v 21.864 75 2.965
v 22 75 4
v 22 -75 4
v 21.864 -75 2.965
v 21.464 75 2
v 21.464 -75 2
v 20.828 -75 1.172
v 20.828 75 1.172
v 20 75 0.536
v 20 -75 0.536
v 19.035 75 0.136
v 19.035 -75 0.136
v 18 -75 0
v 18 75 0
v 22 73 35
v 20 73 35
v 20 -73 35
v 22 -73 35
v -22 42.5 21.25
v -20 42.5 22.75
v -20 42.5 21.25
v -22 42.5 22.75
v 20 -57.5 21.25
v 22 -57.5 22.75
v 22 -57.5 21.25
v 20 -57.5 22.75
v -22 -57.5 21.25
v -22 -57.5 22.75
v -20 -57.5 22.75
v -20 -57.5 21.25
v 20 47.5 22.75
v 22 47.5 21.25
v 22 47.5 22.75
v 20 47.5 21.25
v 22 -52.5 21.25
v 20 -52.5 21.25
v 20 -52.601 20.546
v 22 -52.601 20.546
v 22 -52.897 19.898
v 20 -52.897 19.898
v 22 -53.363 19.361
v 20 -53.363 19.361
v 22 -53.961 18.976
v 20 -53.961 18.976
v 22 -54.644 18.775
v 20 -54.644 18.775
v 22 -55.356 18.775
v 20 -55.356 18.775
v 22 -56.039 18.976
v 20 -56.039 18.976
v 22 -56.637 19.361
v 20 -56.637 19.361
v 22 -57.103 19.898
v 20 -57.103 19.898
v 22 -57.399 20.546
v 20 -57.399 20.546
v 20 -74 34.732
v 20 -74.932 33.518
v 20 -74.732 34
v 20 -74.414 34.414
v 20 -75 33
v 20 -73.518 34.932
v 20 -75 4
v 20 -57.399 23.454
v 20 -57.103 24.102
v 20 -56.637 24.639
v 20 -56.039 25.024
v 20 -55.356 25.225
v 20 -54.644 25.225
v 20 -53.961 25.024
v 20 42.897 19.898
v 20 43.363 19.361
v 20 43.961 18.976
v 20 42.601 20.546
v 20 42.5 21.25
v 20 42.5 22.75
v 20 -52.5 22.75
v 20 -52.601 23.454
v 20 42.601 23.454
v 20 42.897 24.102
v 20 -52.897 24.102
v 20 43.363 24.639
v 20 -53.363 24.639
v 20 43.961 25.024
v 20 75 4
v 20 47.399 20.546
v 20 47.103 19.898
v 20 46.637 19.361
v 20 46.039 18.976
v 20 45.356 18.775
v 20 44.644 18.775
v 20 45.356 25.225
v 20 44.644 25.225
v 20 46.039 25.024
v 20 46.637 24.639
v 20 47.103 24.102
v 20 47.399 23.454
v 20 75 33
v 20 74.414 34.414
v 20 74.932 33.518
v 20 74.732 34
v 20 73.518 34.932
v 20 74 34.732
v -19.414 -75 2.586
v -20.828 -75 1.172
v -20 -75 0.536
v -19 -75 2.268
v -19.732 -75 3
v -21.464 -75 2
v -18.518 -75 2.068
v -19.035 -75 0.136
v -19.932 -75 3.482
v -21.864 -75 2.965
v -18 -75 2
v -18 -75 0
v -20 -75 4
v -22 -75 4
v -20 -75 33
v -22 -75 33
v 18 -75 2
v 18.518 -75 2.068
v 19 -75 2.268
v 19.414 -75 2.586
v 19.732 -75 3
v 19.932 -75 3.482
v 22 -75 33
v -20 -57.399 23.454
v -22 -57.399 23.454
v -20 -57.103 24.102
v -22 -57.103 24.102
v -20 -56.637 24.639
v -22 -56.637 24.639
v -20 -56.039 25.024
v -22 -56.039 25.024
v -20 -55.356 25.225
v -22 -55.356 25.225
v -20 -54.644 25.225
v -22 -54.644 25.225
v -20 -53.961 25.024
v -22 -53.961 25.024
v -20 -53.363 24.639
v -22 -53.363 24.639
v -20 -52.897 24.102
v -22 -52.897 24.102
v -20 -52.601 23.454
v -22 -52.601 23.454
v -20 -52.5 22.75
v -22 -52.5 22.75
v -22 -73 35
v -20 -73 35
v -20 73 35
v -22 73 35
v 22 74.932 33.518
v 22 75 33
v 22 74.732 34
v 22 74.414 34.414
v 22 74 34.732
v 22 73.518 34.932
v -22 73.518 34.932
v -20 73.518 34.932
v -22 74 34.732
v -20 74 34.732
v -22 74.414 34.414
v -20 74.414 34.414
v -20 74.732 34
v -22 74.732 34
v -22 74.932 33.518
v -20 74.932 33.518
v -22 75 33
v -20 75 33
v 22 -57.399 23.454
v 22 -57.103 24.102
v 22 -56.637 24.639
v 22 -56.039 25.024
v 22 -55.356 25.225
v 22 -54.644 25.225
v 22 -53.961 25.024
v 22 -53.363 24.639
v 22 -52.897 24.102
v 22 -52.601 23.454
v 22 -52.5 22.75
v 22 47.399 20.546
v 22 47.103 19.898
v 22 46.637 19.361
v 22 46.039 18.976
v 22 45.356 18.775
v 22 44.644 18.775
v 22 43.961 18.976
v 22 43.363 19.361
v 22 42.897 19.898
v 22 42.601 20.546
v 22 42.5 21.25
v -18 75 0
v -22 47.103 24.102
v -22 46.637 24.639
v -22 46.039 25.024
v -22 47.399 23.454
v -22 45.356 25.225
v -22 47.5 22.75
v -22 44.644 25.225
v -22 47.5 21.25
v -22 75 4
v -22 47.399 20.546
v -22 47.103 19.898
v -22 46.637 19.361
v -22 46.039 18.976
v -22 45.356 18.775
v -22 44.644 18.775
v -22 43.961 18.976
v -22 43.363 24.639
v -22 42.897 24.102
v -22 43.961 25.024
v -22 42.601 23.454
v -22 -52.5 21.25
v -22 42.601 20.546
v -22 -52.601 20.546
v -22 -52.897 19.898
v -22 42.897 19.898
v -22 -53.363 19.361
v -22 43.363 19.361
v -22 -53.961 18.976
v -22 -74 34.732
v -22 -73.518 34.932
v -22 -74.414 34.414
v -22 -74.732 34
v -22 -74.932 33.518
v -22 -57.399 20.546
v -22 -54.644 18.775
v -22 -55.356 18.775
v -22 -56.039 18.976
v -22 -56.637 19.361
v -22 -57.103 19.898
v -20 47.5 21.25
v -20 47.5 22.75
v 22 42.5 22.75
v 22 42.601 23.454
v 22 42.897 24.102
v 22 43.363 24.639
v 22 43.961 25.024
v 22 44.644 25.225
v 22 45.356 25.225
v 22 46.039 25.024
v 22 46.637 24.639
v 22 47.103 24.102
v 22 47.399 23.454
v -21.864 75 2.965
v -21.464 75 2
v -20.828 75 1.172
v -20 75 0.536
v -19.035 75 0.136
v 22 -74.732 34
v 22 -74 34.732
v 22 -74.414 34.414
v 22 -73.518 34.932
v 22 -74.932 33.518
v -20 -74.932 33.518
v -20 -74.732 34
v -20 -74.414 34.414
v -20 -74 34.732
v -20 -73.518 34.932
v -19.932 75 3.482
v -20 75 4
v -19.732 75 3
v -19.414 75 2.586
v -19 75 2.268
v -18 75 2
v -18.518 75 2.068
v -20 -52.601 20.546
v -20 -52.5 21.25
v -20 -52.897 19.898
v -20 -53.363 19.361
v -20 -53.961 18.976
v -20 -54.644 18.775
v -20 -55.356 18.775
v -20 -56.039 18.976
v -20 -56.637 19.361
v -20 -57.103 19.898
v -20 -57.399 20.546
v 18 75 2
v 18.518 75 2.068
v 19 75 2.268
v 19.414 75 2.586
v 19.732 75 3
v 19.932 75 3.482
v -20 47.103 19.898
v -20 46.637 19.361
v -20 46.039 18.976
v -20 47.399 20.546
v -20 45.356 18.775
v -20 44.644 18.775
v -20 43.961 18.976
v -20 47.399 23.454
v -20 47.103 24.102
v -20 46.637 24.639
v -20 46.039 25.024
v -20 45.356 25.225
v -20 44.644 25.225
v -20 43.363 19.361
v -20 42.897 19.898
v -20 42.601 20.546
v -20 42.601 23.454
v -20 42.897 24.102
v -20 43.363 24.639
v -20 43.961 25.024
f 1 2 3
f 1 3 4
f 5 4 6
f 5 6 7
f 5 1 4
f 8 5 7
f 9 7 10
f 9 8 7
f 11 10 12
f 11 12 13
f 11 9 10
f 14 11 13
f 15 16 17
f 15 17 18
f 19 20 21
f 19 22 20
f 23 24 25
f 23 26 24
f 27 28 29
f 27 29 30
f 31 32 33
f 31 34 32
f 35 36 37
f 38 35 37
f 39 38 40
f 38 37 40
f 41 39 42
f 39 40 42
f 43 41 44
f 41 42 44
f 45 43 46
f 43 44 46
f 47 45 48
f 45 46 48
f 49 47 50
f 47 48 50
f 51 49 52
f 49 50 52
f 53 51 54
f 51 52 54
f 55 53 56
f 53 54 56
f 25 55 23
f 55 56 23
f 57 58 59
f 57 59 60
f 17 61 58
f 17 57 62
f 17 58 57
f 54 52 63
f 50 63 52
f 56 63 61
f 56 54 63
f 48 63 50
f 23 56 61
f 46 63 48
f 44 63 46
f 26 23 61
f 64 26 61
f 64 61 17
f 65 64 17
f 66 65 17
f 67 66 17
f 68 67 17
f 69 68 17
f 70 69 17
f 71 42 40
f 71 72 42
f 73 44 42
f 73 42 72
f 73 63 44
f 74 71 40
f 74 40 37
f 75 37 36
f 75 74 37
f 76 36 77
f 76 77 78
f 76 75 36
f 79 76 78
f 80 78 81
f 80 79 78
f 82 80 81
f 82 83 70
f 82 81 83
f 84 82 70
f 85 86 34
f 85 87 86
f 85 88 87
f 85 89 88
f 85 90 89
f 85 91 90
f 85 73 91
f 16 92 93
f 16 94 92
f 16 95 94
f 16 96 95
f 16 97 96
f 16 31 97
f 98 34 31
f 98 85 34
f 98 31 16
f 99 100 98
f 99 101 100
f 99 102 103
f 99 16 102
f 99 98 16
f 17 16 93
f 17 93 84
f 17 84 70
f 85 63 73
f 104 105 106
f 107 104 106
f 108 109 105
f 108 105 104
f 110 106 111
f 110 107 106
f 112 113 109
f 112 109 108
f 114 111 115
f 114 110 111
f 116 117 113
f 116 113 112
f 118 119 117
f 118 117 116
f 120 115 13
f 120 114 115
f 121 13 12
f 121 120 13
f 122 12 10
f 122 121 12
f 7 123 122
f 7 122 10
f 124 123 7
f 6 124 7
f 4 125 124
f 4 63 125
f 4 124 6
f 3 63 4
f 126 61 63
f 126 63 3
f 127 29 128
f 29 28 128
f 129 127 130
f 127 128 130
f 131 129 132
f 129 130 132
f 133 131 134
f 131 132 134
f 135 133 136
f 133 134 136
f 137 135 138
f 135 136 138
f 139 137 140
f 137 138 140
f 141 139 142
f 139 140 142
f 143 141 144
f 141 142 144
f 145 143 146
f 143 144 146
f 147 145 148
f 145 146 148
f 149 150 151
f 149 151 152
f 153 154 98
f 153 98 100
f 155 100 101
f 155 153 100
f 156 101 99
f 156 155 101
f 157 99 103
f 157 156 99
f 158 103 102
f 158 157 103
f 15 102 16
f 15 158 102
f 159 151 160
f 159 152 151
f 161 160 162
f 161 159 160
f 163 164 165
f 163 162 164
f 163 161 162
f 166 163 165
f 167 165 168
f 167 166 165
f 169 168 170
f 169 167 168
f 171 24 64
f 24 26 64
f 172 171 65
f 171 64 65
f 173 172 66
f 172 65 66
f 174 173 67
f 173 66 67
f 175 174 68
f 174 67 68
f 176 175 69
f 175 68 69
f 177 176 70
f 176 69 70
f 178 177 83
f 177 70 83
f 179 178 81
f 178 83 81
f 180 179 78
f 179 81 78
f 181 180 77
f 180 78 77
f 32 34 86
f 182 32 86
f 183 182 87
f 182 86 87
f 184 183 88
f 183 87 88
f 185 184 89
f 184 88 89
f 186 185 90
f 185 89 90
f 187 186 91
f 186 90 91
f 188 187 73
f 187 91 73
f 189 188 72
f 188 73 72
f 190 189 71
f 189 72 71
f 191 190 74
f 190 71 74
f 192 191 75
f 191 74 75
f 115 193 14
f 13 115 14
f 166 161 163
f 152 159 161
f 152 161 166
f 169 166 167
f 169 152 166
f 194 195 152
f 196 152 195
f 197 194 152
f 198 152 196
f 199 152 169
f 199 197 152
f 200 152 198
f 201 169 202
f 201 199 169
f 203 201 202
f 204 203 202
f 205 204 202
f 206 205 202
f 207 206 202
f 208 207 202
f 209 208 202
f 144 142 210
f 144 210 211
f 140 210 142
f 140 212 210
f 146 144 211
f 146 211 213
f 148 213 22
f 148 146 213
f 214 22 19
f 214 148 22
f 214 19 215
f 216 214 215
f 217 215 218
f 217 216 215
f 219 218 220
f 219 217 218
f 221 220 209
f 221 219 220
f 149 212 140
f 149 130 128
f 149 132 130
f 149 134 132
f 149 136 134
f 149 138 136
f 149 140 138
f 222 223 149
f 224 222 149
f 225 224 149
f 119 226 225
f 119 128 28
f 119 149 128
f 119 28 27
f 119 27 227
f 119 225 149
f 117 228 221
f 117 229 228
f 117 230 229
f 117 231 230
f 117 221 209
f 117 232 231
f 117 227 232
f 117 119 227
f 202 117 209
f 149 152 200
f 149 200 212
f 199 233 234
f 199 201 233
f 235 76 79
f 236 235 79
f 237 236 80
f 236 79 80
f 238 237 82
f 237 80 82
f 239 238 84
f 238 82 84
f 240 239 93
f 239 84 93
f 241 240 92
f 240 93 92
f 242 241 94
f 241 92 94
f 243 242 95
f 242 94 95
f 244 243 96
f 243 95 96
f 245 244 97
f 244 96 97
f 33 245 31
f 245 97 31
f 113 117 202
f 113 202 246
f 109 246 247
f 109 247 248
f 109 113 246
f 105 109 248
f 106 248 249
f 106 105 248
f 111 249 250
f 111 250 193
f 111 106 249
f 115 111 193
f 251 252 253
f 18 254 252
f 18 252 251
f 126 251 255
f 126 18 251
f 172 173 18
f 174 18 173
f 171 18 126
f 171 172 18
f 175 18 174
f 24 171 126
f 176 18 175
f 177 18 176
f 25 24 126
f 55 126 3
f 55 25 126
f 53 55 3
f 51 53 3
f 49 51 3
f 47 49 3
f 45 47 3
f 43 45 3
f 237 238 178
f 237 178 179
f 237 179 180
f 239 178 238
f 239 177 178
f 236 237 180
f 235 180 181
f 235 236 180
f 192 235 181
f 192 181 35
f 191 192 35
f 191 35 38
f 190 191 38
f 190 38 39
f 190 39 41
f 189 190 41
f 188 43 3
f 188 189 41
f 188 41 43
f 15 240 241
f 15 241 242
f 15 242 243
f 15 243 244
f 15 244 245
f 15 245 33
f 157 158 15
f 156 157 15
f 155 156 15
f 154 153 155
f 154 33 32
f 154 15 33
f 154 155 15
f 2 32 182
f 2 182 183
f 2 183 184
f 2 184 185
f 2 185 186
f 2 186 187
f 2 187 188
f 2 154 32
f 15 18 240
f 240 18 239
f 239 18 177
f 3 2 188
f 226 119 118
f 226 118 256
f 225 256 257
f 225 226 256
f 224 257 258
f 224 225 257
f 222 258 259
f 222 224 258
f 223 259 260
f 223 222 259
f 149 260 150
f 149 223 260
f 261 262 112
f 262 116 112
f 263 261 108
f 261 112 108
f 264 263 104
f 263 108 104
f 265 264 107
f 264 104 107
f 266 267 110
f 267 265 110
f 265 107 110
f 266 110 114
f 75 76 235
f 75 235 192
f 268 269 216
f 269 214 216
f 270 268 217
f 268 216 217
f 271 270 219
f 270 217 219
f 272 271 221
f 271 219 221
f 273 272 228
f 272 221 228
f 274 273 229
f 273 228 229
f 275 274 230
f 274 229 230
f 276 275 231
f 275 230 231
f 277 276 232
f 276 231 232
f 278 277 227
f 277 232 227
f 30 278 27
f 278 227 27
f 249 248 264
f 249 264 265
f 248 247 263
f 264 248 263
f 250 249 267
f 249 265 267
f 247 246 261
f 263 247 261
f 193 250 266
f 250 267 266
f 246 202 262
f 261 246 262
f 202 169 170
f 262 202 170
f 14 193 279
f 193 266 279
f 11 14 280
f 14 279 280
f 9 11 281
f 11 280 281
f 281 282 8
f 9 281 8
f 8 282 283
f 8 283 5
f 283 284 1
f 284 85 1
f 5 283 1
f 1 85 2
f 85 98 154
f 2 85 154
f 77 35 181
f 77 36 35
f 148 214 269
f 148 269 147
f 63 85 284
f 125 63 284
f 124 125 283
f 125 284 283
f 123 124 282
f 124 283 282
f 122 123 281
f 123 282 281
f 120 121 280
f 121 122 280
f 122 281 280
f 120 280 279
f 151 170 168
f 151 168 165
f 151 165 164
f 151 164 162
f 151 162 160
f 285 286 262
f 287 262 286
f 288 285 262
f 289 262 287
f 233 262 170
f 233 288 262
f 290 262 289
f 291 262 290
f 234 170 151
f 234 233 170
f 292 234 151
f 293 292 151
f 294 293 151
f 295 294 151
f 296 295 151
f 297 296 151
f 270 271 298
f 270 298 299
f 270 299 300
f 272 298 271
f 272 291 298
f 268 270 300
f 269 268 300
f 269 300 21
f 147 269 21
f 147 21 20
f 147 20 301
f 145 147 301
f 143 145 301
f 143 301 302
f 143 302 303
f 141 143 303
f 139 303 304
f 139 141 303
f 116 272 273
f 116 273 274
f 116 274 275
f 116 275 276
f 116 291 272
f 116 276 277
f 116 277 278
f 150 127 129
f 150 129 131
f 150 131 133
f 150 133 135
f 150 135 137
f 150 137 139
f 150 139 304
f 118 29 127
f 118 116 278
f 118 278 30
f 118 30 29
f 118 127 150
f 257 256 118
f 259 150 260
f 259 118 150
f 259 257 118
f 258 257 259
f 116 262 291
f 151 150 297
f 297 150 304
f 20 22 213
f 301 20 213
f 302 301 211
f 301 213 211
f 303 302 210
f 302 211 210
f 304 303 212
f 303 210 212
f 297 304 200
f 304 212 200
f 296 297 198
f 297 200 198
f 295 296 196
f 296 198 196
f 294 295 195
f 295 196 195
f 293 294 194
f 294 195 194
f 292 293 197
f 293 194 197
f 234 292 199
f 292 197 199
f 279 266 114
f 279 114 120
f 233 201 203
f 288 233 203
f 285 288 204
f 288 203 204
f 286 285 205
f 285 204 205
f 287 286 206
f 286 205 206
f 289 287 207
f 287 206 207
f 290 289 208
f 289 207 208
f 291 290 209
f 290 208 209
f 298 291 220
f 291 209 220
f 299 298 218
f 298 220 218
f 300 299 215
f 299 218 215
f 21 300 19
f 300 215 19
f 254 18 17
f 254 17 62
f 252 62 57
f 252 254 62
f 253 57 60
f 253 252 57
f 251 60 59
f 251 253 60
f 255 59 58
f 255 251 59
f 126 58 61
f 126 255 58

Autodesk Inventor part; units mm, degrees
ref_plane "YZ Plane" through (0, 0, 0) normal (1, 0, 0) x (0, 1, 0)
ref_plane "XZ Plane" through (0, 0, 0) normal (0, 1, 0) x (-1, 0, 0)
ref_plane "XY Plane" through (0, 0, 0) normal (0, 0, 1) x (1, 0, 0)
sketch "Sketch1" plane through (0, 0, 0) normal (0, 0, 1) x (1, 0, 0)
  line L0 (-20, 75) -> (20, 75)
  line L1 (20, 75) -> (20, -75)
  line L2 (20, -75) -> (-20, -75)
  line L3 (-20, -75) -> (-20, 75)
  line L4 (-20, 75) -> (20, -75) construction
  line L5 (20, 75) -> (-20, -75) construction
  point P0 (0, 0)
  point P1 (0, 0)
  dimension "d0" = 40
  dimension "d1" = 150
extrude "Plate1" add sketch "Sketch1" along normal blind 2
sketch "Sketch2" plane through (-20, -75, 2) normal (-1, 0, 0) x (0, -1, 0)
  line L0 (-150, 0) -> (0, 0)
  line L1 (0, 0) -> (0, 33)
  line L2 (0, 33) -> (-150, 33)
  line L3 (-150, 33) -> (-150, 0)
edge flange "Flange1" height 35 angle 90 thickness 2 bend radius 2 thickness toward (-1, 0, 0) relief tear relief width 2 relief depth 1 corner gap 2 corner form 0 edges at (-20, 0, 2) (20, 0, 2) wall of the first edge with corners at (-20, 75, 2) (-20, -75, 2) (-20, -75, 35) (-20, 75, 35)
bend "Bend1"
corner "Corner1"
sketch "Sketch3" plane through (0, 0, 0) normal (1, 0, 0) x (0, 1, 0)
  line L0 (-75, 4) -> (75, 4) projected
  line L1 (75, 35) -> (75, 4) projected
  line L2 (-75, 35) -> (75, 35) projected
  line L3 (-75, 4) -> (-75, 35) projected
  circle A0 centre (-55, 22) radius 2.5
  line L4 (-55, 22.75) -> (-55, 21.25) construction
  line L5 (-57.5, 22.75) -> (-57.5, 21.25)
  line L6 (-52.5, 21.25) -> (-52.5, 22.75)
  arc A1 (-52.5, 22.75) -> (-57.5, 22.75) centre (-55, 22.75) ccw
  arc A2 (-57.5, 21.25) -> (-52.5, 21.25) centre (-55, 21.25) ccw
  point P0 (0, 0)
  point P1 (-52.5, 22)
  point P2 (-57.5, 22)
  dimension "d13" = 5
  dimension "d14" = 13
  dimension "d15" = 20
  dimension "d29" = 1.5
extrude "Extrusion1" cut sketch "Sketch3" along normal through all both and the other way through all contours A0 | L6 A2 L5 A0 | A0 L5 A1 L6
pattern_linear "Rectangular Pattern2" count 2 spacing 100 along (0, 1, 0) of "Extrusion1"
fillet "Fillet1" radius 2 4 edges at (-21, -75, 35) (21, -75, 35) (-21, 75, 35) (21, 75, 35)
equation "\"d2\" = Thickness"
equation "\"d3\" = BendReliefWidth"
equation "\"d4\" = BendReliefDepth"
equation "\"d5\" = MinimumRemnant"
equation "\"d6\" = TransitionRadius"
equation "\"d9\" = BendRadius"
equation "\"d10\" = CornerReliefSize"
equation "\"d11\" = GapSize"
equation "\"d12\" = JacobiRadiusSize"
equation "\"BendRadius\" = Thickness"
equation "\"BendReliefWidth\" = Thickness"
equation "\"BendReliefDepth\" = 0.5 * Thickness"
equation "\"CornerReliefSize\" = 4 * Thickness"
equation "\"MinimumRemnant\" = 2 * Thickness"
equation "\"TransitionRadius\" = BendRadius"
equation "\"JacobiRadiusSize\" = BendRadius"
equation "\"GapSize\" = Thickness"
equation "\"Thickness\" = 2"
properties part number "NDM 7.44 bracket middle" material "Stainless Steel"
